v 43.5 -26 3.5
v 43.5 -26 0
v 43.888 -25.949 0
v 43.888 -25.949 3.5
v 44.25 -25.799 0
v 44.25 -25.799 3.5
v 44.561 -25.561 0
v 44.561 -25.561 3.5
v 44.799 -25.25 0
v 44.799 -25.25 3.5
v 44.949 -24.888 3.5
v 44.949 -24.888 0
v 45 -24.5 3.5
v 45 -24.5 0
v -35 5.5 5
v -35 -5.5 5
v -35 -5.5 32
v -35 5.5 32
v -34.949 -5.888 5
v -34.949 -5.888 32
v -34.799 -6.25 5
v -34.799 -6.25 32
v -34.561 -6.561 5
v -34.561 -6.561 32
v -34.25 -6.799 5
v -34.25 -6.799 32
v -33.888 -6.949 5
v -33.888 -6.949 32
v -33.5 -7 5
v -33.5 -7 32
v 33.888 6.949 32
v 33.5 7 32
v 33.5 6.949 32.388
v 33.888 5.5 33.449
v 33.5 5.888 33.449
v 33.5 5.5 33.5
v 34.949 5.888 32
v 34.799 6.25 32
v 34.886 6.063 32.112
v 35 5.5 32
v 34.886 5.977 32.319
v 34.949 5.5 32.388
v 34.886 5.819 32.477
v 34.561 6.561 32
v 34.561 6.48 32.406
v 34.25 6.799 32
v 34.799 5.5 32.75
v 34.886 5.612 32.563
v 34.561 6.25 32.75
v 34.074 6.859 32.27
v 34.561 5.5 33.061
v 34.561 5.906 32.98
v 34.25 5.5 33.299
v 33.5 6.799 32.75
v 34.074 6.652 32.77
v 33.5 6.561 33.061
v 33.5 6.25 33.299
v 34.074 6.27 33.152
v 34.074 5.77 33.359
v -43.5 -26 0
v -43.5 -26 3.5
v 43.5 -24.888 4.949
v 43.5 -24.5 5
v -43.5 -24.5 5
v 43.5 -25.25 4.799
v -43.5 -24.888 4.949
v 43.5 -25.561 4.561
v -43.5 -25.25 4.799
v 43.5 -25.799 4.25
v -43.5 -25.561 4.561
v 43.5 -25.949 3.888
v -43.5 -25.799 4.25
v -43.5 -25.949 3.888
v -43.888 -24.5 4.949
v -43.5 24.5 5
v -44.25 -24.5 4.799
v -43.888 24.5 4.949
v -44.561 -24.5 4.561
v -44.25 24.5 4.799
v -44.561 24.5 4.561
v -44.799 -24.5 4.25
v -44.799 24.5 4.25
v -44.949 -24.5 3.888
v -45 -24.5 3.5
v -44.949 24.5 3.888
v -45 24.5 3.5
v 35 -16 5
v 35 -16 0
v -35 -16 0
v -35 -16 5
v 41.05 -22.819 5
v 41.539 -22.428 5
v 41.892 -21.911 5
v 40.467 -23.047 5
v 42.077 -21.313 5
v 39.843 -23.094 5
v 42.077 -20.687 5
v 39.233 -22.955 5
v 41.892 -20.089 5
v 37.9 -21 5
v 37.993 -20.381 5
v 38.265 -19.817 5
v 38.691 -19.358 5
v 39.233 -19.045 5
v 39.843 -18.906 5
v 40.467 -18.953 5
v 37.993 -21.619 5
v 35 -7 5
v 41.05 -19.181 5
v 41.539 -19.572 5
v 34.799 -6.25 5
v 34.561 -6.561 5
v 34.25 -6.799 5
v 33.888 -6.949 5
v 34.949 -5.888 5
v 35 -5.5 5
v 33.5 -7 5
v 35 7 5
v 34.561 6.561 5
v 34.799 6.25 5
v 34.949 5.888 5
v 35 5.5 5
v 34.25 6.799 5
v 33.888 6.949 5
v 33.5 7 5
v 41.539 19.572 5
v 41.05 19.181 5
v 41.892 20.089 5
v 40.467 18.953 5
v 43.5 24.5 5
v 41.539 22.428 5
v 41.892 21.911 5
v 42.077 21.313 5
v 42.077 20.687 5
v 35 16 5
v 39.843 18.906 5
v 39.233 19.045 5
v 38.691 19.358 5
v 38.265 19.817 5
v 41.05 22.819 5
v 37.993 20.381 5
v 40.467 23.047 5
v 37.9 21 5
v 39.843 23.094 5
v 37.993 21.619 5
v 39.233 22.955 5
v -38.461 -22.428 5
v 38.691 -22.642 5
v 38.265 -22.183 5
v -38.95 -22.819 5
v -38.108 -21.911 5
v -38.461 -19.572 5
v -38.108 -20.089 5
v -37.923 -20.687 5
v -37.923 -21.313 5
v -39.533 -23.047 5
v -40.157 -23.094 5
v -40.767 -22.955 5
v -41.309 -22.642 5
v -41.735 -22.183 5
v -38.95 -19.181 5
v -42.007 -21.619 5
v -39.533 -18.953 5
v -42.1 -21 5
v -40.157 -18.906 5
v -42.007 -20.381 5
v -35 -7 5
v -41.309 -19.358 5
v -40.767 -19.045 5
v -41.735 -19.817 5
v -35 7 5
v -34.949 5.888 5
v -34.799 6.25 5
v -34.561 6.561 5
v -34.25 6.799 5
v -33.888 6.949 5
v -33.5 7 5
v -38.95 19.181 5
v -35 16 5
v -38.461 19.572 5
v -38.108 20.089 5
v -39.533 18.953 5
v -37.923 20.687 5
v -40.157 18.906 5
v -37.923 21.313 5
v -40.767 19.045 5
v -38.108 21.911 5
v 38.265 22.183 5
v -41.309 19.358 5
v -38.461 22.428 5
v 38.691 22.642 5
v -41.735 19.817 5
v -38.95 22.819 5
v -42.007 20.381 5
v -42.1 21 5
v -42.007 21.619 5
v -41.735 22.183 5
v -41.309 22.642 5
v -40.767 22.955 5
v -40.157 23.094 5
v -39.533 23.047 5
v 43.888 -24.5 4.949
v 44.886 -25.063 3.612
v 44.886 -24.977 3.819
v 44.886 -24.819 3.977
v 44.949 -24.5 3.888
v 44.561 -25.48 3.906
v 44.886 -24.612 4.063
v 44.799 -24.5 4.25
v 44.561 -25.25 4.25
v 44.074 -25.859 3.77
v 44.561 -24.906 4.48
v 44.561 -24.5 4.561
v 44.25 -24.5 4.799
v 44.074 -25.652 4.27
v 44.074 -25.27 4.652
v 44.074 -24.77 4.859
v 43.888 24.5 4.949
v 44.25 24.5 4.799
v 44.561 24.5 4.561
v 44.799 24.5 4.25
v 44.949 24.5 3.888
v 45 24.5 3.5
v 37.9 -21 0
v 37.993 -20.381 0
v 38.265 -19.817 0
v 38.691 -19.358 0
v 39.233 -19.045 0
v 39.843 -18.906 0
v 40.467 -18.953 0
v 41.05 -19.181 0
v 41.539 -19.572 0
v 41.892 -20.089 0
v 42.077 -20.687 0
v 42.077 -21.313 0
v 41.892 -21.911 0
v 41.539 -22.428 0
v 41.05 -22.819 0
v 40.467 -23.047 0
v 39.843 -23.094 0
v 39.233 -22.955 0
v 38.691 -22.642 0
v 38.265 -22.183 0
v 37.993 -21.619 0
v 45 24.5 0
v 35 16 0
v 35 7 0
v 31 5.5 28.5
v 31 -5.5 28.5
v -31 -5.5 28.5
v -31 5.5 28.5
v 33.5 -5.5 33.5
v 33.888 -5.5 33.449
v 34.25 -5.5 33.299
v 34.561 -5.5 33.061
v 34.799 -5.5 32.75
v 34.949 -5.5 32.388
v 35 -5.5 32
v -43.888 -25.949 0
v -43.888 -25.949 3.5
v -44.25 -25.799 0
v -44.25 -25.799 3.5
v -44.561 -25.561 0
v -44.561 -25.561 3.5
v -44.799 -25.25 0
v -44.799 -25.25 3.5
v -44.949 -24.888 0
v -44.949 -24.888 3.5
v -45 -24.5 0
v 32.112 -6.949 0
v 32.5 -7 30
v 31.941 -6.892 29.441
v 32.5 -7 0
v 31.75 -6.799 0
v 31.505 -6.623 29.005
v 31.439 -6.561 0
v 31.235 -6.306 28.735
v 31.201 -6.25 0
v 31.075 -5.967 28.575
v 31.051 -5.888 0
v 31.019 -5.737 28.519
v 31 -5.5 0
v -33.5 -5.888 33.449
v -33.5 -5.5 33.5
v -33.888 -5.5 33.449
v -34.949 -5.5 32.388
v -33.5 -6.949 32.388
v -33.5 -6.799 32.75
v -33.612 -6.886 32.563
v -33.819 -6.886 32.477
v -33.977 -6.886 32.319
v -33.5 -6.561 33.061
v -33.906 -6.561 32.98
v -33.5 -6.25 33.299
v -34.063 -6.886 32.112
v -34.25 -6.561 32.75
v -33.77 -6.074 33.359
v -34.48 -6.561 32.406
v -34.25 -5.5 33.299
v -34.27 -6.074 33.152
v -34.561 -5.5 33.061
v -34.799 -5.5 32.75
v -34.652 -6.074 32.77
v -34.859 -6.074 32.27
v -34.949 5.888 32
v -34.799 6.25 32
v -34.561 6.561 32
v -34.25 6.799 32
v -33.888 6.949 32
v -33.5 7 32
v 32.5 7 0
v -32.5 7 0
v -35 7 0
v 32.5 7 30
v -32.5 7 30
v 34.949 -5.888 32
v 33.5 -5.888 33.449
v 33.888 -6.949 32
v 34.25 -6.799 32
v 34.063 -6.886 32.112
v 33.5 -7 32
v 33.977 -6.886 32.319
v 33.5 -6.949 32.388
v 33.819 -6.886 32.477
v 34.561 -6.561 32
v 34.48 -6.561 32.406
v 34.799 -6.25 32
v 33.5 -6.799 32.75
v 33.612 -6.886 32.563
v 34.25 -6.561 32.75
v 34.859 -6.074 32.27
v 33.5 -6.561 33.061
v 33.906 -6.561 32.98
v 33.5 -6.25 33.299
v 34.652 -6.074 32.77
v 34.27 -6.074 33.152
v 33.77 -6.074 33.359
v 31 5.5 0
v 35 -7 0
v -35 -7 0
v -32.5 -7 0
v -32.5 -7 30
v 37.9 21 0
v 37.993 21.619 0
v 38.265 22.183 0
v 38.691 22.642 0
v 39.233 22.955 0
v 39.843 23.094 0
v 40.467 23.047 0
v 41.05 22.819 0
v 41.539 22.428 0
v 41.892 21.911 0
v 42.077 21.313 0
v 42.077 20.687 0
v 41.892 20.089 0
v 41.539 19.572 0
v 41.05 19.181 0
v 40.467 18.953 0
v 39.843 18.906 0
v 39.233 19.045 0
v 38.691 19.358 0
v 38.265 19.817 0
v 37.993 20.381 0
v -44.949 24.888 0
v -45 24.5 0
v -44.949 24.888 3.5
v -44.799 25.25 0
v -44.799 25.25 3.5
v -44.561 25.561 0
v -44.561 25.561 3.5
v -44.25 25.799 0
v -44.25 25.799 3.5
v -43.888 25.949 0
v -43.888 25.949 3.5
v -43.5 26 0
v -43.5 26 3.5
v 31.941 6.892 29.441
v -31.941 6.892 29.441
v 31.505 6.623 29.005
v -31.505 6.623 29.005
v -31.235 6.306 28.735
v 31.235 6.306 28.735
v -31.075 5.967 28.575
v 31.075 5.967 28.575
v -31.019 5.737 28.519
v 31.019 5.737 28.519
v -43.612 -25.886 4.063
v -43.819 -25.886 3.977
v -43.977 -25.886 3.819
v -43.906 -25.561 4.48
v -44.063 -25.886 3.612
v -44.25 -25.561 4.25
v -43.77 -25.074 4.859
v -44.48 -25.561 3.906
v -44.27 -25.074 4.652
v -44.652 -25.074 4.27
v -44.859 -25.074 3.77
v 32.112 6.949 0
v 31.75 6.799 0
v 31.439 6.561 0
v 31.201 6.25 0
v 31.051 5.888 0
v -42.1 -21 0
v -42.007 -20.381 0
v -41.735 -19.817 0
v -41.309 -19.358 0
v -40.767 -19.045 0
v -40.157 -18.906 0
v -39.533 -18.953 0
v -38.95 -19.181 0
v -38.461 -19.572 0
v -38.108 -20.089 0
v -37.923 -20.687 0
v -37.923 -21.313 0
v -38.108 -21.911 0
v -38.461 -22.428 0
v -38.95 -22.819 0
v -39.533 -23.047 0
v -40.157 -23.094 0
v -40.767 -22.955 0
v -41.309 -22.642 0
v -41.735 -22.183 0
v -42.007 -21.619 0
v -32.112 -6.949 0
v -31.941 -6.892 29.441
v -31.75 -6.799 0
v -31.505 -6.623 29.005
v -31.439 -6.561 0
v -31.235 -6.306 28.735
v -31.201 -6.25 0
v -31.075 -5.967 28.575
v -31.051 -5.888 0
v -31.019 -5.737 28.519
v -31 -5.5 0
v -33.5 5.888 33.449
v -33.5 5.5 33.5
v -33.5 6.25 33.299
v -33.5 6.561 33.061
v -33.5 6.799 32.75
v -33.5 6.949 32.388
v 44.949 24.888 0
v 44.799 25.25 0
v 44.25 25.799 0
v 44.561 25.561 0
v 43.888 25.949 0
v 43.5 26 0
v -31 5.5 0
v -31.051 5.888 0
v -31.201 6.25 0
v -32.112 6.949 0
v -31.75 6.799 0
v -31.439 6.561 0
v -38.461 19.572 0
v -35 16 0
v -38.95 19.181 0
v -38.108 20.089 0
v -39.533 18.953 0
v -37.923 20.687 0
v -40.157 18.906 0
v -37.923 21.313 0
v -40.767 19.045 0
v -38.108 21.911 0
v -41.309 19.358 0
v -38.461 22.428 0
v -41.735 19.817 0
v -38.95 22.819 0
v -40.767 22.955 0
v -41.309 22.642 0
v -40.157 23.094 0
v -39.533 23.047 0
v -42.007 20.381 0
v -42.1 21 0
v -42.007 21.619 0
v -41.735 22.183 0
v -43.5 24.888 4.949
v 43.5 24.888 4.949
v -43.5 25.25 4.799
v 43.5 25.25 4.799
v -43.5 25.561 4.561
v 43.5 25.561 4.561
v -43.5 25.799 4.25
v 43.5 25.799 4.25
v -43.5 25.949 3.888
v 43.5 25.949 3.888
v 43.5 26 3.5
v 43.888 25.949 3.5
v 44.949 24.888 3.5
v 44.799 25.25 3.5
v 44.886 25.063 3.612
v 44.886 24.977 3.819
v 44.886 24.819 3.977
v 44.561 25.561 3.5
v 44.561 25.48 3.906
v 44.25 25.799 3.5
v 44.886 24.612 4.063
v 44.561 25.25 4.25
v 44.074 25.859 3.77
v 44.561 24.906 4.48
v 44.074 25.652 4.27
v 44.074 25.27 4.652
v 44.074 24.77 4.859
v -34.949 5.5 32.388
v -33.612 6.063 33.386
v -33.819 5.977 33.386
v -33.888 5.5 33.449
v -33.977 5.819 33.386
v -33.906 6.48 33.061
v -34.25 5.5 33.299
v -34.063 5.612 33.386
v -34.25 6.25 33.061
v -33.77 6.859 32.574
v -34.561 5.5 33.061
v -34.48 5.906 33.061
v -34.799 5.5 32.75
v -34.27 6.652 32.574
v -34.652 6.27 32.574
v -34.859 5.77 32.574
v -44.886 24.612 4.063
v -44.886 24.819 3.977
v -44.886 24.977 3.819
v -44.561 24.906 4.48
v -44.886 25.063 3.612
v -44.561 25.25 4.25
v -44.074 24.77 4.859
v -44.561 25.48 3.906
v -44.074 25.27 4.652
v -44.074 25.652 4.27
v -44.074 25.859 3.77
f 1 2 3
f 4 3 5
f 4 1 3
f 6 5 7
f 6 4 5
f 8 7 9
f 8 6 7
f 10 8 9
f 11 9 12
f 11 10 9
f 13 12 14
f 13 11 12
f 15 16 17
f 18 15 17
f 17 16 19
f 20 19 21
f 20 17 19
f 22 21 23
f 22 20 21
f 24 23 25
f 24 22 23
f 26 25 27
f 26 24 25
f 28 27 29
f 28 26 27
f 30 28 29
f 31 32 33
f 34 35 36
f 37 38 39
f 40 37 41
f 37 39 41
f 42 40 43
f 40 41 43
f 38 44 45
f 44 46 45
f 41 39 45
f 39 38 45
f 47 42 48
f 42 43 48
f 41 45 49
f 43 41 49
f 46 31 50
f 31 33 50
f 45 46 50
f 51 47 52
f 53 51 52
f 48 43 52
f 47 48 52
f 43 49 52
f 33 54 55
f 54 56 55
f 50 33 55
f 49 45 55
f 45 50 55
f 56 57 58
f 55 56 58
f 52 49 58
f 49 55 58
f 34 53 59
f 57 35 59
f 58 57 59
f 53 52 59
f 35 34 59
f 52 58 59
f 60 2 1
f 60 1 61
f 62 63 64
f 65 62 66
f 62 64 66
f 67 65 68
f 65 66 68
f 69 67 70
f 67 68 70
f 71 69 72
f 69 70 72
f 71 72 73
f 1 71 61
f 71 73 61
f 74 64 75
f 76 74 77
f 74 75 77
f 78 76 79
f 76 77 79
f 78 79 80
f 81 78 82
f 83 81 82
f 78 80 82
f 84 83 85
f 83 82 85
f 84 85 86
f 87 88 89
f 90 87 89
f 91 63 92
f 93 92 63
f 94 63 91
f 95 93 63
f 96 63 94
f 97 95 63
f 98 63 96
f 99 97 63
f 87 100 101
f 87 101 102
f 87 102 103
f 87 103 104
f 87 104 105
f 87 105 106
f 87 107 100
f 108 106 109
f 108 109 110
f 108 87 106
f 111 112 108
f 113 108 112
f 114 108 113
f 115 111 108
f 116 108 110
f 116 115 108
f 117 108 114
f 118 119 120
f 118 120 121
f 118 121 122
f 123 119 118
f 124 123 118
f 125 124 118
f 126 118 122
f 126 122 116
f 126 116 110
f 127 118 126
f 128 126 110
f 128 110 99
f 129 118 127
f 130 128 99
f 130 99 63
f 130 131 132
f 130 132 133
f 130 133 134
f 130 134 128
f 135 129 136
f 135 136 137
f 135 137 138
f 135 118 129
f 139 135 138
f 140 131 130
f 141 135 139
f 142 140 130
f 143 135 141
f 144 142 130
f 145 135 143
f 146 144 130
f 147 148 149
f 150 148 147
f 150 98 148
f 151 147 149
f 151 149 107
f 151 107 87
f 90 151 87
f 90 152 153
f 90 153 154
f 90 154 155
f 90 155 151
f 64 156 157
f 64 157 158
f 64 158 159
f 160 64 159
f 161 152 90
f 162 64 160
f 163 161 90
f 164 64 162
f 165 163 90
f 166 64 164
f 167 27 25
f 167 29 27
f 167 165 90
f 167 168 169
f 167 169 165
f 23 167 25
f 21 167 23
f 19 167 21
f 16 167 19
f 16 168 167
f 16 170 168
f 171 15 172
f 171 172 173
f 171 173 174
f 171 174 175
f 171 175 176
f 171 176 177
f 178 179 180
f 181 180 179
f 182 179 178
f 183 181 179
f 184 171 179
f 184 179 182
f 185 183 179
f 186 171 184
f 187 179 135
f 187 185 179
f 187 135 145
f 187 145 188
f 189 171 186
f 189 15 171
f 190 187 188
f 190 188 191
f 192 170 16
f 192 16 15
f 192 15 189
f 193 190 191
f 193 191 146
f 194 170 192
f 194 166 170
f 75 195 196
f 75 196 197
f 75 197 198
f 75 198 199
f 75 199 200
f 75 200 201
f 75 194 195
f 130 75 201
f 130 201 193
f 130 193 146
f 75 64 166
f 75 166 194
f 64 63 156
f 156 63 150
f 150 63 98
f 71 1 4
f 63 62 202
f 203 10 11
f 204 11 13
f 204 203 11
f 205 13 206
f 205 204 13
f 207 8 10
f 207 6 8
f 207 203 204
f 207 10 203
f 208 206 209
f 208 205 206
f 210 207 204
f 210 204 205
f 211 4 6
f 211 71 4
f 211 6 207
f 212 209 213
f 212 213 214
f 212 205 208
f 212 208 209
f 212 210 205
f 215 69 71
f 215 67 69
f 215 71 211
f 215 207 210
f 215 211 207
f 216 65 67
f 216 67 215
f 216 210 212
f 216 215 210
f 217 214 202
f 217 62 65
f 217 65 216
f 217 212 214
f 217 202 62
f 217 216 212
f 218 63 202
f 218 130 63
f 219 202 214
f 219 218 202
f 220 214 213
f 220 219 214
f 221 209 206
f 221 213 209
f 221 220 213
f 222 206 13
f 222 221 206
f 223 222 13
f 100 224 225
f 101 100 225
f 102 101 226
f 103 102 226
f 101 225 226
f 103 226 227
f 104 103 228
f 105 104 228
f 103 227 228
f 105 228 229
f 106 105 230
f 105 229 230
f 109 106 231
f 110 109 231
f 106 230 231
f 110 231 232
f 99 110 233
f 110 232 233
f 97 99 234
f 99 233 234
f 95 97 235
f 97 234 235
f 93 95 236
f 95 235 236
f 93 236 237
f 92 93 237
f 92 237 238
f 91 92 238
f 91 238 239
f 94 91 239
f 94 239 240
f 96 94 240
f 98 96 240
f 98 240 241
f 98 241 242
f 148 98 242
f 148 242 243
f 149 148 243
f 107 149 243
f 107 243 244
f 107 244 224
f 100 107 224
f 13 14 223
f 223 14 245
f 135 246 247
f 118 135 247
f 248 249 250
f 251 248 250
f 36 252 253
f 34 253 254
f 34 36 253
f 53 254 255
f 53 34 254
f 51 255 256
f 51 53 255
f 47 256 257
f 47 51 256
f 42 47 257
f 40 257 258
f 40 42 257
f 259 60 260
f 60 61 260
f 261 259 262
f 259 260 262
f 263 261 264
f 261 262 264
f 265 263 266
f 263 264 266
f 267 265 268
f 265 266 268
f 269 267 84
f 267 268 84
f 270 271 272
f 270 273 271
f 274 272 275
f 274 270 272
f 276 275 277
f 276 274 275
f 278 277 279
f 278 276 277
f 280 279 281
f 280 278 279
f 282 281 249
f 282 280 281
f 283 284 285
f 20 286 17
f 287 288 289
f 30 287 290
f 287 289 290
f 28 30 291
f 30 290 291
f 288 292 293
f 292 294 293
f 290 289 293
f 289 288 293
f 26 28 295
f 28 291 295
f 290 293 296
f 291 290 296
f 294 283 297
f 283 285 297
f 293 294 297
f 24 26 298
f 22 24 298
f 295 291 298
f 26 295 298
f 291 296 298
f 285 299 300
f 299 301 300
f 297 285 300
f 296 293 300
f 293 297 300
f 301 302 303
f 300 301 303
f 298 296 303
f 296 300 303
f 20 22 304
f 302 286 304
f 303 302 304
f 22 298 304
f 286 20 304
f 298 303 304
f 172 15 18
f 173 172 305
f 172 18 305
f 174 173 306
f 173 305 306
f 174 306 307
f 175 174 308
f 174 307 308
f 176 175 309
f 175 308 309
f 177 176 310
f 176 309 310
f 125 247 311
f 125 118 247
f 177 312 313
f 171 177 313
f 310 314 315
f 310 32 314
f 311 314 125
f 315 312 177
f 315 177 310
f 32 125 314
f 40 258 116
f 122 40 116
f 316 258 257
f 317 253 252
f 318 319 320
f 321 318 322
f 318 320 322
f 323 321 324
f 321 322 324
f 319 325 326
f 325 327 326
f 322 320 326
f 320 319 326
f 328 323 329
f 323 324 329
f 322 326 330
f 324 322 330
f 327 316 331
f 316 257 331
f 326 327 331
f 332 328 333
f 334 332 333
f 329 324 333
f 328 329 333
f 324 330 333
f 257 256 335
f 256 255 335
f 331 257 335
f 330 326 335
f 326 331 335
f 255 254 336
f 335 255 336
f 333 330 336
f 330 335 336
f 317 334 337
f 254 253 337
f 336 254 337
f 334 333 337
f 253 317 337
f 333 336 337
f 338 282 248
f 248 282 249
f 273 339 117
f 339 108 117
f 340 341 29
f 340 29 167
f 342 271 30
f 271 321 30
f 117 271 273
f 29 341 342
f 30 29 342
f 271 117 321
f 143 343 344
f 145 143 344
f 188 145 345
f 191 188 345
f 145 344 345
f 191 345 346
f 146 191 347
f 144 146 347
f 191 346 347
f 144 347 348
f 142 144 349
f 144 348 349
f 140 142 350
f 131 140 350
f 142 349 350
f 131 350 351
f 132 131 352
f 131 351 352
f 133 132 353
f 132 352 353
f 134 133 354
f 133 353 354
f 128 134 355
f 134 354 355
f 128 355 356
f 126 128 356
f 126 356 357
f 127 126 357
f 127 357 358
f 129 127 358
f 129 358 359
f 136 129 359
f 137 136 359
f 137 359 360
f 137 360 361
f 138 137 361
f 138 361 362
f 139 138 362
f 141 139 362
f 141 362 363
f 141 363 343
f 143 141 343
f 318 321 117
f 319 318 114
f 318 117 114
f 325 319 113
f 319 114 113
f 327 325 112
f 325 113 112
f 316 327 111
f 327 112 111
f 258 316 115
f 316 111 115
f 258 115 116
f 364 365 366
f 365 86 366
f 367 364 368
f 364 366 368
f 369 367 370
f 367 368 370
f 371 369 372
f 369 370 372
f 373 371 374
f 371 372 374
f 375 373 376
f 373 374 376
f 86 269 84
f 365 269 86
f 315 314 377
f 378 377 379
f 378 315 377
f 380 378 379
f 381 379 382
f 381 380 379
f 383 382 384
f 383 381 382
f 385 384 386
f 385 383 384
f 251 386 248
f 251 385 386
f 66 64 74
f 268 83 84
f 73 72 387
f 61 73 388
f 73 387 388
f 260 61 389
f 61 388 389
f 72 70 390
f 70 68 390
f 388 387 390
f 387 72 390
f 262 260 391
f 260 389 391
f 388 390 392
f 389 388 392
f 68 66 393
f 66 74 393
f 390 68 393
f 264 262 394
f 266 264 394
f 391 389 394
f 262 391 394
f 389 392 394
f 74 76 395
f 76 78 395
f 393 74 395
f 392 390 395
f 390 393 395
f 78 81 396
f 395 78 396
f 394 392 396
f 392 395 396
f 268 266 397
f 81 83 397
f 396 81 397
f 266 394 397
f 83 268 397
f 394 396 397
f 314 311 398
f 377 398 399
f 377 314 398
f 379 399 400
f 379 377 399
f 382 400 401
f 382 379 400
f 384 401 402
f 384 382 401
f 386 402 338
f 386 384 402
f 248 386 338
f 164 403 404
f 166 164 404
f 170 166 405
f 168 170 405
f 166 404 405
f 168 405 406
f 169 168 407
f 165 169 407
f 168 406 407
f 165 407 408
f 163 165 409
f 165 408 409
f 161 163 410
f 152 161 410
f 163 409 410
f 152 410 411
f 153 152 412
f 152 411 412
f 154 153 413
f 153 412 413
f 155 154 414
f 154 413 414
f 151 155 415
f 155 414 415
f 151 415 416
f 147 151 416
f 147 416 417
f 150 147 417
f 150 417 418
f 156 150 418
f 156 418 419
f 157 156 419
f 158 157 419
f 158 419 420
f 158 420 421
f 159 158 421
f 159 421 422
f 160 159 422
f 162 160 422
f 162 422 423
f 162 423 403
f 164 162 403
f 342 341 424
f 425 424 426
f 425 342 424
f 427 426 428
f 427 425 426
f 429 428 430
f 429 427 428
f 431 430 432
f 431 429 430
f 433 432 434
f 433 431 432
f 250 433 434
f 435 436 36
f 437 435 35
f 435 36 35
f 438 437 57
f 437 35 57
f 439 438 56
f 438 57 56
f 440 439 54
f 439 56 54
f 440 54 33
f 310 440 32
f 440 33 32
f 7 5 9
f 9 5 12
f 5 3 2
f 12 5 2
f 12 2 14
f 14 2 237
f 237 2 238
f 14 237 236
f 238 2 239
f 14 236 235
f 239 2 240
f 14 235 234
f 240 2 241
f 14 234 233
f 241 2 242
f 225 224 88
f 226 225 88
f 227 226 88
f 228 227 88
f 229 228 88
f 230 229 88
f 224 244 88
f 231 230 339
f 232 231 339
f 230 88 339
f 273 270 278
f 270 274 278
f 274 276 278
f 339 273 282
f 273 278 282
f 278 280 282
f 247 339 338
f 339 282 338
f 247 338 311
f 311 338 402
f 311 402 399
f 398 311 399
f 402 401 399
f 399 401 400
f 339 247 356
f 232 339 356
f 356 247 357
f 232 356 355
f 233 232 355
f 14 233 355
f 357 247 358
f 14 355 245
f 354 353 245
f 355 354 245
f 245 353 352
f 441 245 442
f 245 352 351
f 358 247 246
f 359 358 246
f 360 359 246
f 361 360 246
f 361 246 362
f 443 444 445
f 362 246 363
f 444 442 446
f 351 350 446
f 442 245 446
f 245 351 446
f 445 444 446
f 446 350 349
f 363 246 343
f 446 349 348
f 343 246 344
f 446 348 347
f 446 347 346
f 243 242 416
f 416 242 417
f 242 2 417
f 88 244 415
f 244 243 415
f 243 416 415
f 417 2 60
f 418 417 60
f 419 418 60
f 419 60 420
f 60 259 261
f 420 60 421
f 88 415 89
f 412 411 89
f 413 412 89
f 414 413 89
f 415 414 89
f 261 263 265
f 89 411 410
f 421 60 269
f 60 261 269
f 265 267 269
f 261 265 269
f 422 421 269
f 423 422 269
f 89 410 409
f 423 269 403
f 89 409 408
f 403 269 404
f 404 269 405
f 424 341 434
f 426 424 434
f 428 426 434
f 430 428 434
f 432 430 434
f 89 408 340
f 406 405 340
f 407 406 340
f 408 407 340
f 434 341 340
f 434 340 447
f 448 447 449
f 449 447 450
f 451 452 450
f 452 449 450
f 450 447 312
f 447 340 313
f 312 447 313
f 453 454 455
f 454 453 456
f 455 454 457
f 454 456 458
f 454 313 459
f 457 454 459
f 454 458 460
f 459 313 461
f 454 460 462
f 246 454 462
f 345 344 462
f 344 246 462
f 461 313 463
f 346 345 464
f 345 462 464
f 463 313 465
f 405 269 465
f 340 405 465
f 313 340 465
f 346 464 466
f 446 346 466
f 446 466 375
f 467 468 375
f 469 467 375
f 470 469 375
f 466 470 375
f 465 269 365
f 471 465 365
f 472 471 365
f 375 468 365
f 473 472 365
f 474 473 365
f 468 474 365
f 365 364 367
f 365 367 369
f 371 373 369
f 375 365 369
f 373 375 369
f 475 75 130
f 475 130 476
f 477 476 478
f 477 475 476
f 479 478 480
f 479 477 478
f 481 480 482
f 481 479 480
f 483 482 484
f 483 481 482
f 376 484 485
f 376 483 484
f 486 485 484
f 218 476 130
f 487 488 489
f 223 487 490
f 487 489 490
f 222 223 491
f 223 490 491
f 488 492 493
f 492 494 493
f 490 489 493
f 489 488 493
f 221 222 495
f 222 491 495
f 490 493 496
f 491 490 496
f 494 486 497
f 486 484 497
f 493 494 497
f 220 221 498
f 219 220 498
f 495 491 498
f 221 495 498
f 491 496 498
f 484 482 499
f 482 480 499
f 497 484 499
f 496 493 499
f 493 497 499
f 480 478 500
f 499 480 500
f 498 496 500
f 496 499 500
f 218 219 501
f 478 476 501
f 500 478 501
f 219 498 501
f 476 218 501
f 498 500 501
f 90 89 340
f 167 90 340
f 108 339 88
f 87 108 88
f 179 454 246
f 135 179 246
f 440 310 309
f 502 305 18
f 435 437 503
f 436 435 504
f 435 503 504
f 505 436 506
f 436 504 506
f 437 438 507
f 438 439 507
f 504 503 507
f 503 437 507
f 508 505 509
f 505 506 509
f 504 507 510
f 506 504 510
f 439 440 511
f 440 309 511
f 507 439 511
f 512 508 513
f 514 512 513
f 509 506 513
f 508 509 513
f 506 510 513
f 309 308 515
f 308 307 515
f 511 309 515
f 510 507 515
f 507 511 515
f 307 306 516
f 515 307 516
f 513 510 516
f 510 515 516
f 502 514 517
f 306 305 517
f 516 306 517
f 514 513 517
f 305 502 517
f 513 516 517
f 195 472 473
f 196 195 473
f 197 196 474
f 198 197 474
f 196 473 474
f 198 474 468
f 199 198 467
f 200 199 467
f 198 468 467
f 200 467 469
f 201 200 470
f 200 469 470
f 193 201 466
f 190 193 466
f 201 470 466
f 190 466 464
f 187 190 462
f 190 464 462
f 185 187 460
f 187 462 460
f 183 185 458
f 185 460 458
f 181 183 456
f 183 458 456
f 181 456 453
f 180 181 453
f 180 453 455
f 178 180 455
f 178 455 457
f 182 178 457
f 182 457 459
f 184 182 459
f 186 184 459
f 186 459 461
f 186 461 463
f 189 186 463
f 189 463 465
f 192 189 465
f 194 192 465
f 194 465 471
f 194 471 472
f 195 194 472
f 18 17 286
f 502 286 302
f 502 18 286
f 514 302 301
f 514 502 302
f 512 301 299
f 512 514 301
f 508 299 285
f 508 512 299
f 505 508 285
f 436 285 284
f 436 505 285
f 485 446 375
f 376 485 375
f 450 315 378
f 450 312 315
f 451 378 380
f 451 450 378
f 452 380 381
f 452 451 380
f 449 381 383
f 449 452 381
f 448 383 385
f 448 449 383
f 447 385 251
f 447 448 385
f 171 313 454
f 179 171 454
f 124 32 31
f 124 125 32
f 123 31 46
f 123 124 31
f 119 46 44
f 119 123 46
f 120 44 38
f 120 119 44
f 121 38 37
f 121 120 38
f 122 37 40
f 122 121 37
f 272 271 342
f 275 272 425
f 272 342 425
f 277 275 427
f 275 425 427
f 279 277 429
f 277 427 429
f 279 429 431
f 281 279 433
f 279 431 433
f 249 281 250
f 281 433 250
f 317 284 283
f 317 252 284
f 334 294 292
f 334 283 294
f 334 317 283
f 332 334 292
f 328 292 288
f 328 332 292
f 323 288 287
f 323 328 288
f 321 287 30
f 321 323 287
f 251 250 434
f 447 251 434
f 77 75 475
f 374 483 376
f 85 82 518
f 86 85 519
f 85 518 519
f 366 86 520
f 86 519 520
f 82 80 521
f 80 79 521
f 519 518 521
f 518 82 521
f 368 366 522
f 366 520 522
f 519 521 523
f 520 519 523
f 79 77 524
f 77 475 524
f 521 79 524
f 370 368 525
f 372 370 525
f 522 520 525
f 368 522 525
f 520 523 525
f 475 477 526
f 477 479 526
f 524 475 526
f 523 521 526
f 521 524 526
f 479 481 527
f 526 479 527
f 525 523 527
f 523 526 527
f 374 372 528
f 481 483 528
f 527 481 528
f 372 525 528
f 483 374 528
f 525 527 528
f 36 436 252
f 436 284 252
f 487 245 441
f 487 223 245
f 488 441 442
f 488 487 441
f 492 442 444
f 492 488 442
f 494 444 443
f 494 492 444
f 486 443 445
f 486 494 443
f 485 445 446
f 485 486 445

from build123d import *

# Parameters (mm, degrees)
SKETCH2_W                 = 52
SKETCH2_H                 = 90
BOSS_EXTRUDE1_DEPTH       = 5
BOSS_EXTRUDE2_DEPTH       = 14
M5X0_8_TAPPED_HOLE1_D     = 4.2
M5X0_8_TAPPED_HOLE1_DEPTH = 7.5
M5X0_8_TAPPED_HOLE1_TIP   = 1.2618073
FILLET1_R                 = 1.5


with BuildPart() as part:
    # Sketch2 → Boss-Extrude1 (new body)
    with BuildSketch(Plane(origin=(0, 0, 0), x_dir=(0, 1, 0), z_dir=(0, 0, 1))):
        Rectangle(SKETCH2_W, SKETCH2_H)
        Polygon((-16, 35), (-7, 35), (-7, 31), (7, 31), (7, 35), (16, 35), (16, -35), (7, -35), (7, -31), (-7, -31), (-7, -35), (-16, -35), align=None, mode=Mode.SUBTRACT)
    extrude(amount=BOSS_EXTRUDE1_DEPTH)

    # Sketch4 → Boss-Extrude2 (add)
    with BuildSketch(Plane.XZ.offset(7)):
        Polygon((-35, 5), (-35, 33.5), (35, 33.5), (35, 5), (31, 5), (31, 28.5), (-31, 28.5), (-31, 5), align=None)
    extrude(amount=-BOSS_EXTRUDE2_DEPTH)

    # M5x0.8 Tapped Hole1
    with Locations(Plane.XY.offset(5)):
        with Locations((-40, 21), (40, 21), (-40, -21), (40, -21)):
            Hole(M5X0_8_TAPPED_HOLE1_D / 2, depth=M5X0_8_TAPPED_HOLE1_DEPTH)
            with Locations((0, 0, -(M5X0_8_TAPPED_HOLE1_DEPTH + M5X0_8_TAPPED_HOLE1_TIP / 2))):  # 118° drill point
                Cone(0, M5X0_8_TAPPED_HOLE1_D / 2, M5X0_8_TAPPED_HOLE1_TIP, mode=Mode.SUBTRACT)

    # Fillet1
    fillet1_edges = [part.edges().sort_by_distance(p)[0] for p in [
        (0, 26, 5),
        (-45, 0, 5),
        (31, -7, 14.25),
        (31, 7, 14.25),
        (-31, 7, 14.25),
        (-31, -7, 14.25),
        (0, -26, 5),
        (-35, 7, 19.25),
        (0, 7, 33.5),
        (-35, 0, 33.5),
        (35, 7, 19.25),
        (35, 0, 33.5),
        (0, 7, 28.5),
        (0, -7, 28.5),
        (35, -7, 19.25),
        (0, -7, 33.5),
        (-35, -7, 19.25),
        (-45, -26, 2.5),
        (-45, 26, 2.5),
        (45, 26, 2.5),
        (45, -26, 2.5),
        (45, 0, 5),
    ]]
    fillet(fillet1_edges, radius=FILLET1_R)


solid = part.part
